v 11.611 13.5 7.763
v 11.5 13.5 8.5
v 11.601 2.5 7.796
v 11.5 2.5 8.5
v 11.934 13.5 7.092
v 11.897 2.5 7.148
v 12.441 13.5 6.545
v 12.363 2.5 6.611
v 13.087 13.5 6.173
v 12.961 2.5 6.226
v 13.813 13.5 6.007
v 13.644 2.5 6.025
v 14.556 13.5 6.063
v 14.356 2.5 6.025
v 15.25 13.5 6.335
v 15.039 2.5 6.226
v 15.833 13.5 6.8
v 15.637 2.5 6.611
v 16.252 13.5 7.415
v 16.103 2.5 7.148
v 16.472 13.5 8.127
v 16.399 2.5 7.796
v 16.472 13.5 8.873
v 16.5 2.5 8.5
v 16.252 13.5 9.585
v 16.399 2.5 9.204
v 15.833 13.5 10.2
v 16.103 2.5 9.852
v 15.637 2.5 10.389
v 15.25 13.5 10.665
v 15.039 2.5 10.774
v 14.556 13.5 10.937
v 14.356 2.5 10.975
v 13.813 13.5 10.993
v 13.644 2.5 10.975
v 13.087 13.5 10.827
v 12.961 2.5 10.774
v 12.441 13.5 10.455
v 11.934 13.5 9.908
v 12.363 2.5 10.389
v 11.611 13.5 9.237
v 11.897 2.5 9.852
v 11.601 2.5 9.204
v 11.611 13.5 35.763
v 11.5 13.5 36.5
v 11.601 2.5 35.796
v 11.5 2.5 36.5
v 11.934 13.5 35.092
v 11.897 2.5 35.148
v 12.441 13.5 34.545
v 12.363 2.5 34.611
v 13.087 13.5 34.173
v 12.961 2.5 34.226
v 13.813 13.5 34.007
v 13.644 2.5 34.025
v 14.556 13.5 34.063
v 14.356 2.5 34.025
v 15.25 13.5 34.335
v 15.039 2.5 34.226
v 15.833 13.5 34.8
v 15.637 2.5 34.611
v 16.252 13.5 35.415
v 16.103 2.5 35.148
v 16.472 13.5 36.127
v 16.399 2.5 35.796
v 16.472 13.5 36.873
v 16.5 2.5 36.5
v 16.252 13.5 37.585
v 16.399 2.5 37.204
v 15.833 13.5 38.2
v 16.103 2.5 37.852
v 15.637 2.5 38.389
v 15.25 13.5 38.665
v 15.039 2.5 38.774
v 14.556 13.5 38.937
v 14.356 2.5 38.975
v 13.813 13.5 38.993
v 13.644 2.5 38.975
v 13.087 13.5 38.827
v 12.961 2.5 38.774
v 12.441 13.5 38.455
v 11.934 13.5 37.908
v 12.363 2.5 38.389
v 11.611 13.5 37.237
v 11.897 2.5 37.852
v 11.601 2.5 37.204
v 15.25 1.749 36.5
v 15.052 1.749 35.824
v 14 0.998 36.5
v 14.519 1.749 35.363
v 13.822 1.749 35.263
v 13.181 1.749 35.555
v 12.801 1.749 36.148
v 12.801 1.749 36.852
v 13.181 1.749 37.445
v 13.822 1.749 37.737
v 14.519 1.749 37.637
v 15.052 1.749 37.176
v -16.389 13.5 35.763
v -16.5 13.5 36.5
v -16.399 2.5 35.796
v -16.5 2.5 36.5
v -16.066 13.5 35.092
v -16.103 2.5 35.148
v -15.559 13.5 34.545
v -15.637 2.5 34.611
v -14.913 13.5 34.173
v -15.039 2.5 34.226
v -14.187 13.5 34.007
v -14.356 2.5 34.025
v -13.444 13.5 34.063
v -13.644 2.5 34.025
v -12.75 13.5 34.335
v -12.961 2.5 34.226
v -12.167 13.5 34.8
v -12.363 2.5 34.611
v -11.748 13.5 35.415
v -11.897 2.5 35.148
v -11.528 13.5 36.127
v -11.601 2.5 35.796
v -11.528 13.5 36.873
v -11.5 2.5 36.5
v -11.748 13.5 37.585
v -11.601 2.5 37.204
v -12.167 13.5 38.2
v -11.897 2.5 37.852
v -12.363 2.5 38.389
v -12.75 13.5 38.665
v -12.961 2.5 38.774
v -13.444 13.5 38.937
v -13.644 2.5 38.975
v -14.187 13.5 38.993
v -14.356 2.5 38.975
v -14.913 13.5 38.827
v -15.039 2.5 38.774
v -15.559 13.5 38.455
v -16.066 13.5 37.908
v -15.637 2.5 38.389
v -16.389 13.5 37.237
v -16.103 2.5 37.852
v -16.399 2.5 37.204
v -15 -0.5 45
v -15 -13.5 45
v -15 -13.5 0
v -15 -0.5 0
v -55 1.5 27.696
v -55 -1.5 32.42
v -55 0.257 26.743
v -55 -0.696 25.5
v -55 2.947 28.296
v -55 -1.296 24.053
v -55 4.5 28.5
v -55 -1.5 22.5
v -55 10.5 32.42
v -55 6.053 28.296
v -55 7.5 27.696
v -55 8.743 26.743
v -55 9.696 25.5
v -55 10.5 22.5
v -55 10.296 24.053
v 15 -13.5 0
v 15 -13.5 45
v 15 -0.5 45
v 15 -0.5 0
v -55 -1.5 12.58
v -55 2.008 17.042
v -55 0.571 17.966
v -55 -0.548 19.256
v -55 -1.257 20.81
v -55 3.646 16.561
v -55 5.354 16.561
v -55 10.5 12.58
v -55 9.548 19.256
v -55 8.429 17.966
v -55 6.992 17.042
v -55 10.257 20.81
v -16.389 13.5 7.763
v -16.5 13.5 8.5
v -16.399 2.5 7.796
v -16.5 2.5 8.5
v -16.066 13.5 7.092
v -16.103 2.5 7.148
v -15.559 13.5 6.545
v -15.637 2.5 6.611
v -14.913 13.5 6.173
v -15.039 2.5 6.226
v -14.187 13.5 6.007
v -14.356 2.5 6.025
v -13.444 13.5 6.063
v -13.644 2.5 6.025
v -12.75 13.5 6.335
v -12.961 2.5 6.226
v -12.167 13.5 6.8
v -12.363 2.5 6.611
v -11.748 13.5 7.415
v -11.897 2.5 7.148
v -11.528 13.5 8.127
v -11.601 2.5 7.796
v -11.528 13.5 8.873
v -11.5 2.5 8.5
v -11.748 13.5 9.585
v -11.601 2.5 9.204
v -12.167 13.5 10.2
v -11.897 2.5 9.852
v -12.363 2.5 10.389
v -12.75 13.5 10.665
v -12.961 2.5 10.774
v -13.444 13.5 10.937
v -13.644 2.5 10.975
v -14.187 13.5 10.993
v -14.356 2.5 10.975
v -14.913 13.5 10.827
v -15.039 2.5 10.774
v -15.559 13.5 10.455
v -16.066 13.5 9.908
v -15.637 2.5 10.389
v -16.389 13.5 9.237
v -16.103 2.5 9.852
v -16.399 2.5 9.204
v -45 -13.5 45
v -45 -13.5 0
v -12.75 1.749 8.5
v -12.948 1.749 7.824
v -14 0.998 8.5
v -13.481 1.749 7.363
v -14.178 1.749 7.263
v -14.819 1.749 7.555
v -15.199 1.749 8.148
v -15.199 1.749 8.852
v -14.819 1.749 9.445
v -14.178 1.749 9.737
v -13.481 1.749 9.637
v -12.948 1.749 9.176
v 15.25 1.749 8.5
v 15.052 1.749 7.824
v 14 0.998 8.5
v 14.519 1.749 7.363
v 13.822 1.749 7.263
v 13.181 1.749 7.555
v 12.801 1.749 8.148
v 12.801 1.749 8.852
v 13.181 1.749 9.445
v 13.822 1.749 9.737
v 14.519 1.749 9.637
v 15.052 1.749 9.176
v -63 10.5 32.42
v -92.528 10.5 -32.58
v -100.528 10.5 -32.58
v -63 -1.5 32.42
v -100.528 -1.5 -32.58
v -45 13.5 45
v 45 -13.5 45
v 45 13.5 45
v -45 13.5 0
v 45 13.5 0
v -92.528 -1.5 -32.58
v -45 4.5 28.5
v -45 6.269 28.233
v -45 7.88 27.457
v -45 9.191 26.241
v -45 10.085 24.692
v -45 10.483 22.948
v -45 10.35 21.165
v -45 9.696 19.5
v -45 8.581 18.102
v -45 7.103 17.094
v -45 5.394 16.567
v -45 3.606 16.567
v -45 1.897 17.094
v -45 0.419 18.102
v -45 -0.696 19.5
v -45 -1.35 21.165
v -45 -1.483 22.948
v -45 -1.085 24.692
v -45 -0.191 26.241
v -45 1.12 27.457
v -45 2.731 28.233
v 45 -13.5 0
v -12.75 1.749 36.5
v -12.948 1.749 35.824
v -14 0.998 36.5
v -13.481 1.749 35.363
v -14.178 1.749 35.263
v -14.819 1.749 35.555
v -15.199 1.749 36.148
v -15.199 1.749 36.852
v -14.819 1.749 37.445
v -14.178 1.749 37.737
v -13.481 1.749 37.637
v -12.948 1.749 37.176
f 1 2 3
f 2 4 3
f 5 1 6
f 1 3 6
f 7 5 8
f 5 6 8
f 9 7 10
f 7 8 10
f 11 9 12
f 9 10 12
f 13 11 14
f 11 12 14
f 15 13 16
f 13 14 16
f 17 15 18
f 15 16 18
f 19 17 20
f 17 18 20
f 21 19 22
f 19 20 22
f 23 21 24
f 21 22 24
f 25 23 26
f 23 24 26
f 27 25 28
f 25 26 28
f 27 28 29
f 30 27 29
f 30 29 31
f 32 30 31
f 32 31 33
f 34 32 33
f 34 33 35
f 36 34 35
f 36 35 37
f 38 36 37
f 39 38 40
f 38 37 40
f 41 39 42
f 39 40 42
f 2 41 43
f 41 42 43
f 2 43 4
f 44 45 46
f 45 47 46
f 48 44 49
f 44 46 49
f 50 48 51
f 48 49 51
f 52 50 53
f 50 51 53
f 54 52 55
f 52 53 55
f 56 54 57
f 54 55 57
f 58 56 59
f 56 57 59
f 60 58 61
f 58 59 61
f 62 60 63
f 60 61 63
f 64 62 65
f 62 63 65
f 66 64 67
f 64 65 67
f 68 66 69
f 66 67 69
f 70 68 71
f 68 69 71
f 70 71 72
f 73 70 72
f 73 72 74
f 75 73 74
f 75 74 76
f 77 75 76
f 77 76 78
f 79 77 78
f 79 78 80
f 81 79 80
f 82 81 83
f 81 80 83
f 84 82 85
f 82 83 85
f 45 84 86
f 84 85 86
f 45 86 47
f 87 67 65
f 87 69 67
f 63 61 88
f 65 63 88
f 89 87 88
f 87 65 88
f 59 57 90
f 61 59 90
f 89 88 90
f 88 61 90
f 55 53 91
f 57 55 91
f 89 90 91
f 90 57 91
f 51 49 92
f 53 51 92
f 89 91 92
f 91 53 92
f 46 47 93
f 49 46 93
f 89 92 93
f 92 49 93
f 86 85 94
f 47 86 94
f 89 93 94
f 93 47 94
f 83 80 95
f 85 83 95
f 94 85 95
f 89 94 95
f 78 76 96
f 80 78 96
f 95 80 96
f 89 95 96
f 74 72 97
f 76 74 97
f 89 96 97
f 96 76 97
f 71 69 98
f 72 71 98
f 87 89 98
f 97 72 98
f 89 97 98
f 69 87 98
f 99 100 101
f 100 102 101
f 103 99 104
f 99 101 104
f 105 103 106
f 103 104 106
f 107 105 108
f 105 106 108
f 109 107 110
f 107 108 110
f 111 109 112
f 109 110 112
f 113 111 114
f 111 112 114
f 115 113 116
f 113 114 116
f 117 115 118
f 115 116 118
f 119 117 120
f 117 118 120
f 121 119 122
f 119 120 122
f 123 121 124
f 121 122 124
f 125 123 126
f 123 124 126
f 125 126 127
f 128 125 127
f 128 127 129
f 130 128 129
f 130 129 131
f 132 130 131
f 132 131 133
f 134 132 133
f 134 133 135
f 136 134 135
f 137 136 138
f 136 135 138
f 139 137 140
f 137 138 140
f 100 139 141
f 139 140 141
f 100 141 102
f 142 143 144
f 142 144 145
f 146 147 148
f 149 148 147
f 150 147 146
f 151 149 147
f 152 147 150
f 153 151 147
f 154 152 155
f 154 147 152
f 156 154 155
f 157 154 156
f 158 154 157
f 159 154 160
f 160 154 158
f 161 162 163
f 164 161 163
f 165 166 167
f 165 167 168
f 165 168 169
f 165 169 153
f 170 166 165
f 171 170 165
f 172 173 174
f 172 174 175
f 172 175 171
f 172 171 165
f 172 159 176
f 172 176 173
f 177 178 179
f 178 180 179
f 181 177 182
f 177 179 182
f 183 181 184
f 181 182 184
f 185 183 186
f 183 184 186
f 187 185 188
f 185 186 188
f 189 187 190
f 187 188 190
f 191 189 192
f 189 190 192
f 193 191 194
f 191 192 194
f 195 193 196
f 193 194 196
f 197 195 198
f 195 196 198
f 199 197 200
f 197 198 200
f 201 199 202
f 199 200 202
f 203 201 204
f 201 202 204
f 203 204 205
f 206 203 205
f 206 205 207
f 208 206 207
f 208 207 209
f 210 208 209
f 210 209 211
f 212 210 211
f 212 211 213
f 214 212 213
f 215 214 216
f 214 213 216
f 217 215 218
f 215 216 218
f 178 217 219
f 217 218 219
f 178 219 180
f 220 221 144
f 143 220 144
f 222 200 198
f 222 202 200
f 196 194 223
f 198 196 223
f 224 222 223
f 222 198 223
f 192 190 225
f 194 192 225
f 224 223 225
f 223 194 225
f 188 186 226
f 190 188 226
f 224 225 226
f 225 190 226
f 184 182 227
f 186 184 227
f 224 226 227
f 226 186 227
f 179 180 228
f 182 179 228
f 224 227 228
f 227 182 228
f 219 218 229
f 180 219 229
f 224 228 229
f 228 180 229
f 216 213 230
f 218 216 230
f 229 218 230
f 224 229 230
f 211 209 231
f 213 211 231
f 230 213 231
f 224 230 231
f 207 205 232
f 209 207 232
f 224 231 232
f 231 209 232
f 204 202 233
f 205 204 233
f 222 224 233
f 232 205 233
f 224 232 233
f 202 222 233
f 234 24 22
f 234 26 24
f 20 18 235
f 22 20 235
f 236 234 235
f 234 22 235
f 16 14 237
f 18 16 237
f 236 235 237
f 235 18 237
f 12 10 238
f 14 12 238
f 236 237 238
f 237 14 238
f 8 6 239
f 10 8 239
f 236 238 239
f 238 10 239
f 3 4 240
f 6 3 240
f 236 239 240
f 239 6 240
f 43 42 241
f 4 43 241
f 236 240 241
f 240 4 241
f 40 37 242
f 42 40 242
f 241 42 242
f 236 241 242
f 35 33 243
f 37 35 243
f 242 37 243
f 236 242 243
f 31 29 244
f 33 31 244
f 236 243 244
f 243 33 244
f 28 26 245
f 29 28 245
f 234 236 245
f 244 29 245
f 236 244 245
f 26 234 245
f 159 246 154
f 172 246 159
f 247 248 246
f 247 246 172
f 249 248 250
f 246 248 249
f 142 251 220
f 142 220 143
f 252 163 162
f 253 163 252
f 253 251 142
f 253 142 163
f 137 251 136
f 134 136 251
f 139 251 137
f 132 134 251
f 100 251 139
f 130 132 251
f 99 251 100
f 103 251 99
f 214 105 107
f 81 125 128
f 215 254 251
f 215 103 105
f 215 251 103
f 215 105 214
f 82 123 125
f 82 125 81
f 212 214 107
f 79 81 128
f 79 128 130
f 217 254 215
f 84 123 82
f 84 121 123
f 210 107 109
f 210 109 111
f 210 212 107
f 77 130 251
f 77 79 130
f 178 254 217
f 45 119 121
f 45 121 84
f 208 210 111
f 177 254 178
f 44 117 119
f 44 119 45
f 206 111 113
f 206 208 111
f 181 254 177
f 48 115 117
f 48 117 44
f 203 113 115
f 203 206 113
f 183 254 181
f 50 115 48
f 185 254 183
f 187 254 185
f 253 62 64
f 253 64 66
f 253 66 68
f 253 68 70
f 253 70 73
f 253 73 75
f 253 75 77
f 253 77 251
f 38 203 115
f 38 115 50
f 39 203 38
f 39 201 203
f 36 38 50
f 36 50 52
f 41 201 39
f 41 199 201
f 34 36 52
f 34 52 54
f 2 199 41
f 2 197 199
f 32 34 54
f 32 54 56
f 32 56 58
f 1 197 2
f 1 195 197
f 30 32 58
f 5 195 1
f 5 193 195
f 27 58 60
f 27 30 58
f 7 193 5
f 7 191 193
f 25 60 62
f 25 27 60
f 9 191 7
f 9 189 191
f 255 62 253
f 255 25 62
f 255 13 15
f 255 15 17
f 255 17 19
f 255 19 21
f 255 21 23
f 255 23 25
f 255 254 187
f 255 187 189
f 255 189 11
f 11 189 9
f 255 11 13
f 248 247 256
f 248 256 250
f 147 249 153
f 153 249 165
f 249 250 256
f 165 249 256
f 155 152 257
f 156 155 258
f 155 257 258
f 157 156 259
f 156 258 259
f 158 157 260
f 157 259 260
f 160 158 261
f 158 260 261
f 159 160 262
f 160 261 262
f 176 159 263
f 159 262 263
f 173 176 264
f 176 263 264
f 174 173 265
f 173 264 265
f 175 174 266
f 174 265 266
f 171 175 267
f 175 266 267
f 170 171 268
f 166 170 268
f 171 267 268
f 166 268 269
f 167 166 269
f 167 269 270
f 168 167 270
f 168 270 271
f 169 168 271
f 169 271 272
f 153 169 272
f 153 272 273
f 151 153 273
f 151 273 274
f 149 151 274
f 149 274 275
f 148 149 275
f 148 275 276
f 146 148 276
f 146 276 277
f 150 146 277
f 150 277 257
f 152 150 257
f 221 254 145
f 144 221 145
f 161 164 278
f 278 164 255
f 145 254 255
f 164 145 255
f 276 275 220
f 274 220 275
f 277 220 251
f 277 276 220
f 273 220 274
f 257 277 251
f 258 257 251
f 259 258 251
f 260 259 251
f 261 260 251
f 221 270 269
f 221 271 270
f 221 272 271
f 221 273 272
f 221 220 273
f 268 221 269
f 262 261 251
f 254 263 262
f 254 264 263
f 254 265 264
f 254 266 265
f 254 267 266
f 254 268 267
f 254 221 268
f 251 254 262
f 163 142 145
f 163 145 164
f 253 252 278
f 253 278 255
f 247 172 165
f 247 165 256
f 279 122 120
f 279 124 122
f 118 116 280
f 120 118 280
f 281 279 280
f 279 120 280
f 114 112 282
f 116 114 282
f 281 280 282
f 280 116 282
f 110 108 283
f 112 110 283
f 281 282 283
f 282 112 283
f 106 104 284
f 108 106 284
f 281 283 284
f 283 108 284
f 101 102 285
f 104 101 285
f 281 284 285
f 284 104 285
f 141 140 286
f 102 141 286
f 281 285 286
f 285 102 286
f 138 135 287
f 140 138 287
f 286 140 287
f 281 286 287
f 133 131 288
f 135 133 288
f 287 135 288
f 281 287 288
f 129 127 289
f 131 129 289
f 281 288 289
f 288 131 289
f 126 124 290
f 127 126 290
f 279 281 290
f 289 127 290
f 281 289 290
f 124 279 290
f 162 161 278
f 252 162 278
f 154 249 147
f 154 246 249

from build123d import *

# Parameters (mm, degrees)
SKETCH_1_W             = 90
SKETCH_1_H             = 27
EXTRUDE_1_DEPTH        = 45
SKETCH_2_W             = 30
SKETCH_2_H             = 26
CUT_EXTRUDE_1_DEPTH    = 66.055745327
HOLE_WIZARD_M6_1_D     = 5
HOLE_WIZARD_M6_1_DEPTH = 11
HOLE_WIZARD_M6_1_TIP   = 1.502151548
SKETCH_6_R             = 6
EXTRUDE_2_DEPTH        = 10
EXTRUDE_3_DEPTH        = 6


with BuildPart() as part:
    # 草图1 → 凸台-拉伸1 (new body)
    with BuildSketch(Plane.XY):
        Rectangle(SKETCH_1_W, SKETCH_1_H)
    extrude(amount=EXTRUDE_1_DEPTH)

    # 草图2 → 切除-拉伸1 (cut, through all)
    with BuildSketch(Plane.XY.offset(45)):
        with Locations((0, -13.5)):
            Rectangle(SKETCH_2_W, SKETCH_2_H)
    extrude(amount=-CUT_EXTRUDE_1_DEPTH, mode=Mode.SUBTRACT)

    # M6 螺纹孔1
    with Locations(Plane(origin=(0, 13.5, 0), x_dir=(1, 0, 0), z_dir=(0, 1, 0))):
        with Locations((-14, -8.5), (14, -8.5), (14, -36.5), (-14, -36.5)):
            Hole(HOLE_WIZARD_M6_1_D / 2, depth=HOLE_WIZARD_M6_1_DEPTH)
            with Locations((0, 0, -(HOLE_WIZARD_M6_1_DEPTH + HOLE_WIZARD_M6_1_TIP / 2))):  # 118° drill point
                Cone(0, HOLE_WIZARD_M6_1_D / 2, HOLE_WIZARD_M6_1_TIP, mode=Mode.SUBTRACT)

    # 草图6 → 凸台-拉伸2 (add)
    with BuildSketch(Plane.ZY.offset(45)):
        with Locations((22.5, 4.5)):
            Circle(SKETCH_6_R)
    extrude(amount=EXTRUDE_2_DEPTH)

    # 草图8 → 凸台-拉伸3 (add, symmetric)
    with BuildSketch(Plane(origin=(0, 4.5, 0), x_dir=(1, 0, 0), z_dir=(0, 1, 0))):
        Polygon((-55, -32.420186034), (-55, -12.579813966), (-92.527767497, 32.579813966), (-100.527767497, 32.579813966), (-63, -32.420186034), align=None)
    extrude(amount=EXTRUDE_3_DEPTH, both=True)


solid = part.part
